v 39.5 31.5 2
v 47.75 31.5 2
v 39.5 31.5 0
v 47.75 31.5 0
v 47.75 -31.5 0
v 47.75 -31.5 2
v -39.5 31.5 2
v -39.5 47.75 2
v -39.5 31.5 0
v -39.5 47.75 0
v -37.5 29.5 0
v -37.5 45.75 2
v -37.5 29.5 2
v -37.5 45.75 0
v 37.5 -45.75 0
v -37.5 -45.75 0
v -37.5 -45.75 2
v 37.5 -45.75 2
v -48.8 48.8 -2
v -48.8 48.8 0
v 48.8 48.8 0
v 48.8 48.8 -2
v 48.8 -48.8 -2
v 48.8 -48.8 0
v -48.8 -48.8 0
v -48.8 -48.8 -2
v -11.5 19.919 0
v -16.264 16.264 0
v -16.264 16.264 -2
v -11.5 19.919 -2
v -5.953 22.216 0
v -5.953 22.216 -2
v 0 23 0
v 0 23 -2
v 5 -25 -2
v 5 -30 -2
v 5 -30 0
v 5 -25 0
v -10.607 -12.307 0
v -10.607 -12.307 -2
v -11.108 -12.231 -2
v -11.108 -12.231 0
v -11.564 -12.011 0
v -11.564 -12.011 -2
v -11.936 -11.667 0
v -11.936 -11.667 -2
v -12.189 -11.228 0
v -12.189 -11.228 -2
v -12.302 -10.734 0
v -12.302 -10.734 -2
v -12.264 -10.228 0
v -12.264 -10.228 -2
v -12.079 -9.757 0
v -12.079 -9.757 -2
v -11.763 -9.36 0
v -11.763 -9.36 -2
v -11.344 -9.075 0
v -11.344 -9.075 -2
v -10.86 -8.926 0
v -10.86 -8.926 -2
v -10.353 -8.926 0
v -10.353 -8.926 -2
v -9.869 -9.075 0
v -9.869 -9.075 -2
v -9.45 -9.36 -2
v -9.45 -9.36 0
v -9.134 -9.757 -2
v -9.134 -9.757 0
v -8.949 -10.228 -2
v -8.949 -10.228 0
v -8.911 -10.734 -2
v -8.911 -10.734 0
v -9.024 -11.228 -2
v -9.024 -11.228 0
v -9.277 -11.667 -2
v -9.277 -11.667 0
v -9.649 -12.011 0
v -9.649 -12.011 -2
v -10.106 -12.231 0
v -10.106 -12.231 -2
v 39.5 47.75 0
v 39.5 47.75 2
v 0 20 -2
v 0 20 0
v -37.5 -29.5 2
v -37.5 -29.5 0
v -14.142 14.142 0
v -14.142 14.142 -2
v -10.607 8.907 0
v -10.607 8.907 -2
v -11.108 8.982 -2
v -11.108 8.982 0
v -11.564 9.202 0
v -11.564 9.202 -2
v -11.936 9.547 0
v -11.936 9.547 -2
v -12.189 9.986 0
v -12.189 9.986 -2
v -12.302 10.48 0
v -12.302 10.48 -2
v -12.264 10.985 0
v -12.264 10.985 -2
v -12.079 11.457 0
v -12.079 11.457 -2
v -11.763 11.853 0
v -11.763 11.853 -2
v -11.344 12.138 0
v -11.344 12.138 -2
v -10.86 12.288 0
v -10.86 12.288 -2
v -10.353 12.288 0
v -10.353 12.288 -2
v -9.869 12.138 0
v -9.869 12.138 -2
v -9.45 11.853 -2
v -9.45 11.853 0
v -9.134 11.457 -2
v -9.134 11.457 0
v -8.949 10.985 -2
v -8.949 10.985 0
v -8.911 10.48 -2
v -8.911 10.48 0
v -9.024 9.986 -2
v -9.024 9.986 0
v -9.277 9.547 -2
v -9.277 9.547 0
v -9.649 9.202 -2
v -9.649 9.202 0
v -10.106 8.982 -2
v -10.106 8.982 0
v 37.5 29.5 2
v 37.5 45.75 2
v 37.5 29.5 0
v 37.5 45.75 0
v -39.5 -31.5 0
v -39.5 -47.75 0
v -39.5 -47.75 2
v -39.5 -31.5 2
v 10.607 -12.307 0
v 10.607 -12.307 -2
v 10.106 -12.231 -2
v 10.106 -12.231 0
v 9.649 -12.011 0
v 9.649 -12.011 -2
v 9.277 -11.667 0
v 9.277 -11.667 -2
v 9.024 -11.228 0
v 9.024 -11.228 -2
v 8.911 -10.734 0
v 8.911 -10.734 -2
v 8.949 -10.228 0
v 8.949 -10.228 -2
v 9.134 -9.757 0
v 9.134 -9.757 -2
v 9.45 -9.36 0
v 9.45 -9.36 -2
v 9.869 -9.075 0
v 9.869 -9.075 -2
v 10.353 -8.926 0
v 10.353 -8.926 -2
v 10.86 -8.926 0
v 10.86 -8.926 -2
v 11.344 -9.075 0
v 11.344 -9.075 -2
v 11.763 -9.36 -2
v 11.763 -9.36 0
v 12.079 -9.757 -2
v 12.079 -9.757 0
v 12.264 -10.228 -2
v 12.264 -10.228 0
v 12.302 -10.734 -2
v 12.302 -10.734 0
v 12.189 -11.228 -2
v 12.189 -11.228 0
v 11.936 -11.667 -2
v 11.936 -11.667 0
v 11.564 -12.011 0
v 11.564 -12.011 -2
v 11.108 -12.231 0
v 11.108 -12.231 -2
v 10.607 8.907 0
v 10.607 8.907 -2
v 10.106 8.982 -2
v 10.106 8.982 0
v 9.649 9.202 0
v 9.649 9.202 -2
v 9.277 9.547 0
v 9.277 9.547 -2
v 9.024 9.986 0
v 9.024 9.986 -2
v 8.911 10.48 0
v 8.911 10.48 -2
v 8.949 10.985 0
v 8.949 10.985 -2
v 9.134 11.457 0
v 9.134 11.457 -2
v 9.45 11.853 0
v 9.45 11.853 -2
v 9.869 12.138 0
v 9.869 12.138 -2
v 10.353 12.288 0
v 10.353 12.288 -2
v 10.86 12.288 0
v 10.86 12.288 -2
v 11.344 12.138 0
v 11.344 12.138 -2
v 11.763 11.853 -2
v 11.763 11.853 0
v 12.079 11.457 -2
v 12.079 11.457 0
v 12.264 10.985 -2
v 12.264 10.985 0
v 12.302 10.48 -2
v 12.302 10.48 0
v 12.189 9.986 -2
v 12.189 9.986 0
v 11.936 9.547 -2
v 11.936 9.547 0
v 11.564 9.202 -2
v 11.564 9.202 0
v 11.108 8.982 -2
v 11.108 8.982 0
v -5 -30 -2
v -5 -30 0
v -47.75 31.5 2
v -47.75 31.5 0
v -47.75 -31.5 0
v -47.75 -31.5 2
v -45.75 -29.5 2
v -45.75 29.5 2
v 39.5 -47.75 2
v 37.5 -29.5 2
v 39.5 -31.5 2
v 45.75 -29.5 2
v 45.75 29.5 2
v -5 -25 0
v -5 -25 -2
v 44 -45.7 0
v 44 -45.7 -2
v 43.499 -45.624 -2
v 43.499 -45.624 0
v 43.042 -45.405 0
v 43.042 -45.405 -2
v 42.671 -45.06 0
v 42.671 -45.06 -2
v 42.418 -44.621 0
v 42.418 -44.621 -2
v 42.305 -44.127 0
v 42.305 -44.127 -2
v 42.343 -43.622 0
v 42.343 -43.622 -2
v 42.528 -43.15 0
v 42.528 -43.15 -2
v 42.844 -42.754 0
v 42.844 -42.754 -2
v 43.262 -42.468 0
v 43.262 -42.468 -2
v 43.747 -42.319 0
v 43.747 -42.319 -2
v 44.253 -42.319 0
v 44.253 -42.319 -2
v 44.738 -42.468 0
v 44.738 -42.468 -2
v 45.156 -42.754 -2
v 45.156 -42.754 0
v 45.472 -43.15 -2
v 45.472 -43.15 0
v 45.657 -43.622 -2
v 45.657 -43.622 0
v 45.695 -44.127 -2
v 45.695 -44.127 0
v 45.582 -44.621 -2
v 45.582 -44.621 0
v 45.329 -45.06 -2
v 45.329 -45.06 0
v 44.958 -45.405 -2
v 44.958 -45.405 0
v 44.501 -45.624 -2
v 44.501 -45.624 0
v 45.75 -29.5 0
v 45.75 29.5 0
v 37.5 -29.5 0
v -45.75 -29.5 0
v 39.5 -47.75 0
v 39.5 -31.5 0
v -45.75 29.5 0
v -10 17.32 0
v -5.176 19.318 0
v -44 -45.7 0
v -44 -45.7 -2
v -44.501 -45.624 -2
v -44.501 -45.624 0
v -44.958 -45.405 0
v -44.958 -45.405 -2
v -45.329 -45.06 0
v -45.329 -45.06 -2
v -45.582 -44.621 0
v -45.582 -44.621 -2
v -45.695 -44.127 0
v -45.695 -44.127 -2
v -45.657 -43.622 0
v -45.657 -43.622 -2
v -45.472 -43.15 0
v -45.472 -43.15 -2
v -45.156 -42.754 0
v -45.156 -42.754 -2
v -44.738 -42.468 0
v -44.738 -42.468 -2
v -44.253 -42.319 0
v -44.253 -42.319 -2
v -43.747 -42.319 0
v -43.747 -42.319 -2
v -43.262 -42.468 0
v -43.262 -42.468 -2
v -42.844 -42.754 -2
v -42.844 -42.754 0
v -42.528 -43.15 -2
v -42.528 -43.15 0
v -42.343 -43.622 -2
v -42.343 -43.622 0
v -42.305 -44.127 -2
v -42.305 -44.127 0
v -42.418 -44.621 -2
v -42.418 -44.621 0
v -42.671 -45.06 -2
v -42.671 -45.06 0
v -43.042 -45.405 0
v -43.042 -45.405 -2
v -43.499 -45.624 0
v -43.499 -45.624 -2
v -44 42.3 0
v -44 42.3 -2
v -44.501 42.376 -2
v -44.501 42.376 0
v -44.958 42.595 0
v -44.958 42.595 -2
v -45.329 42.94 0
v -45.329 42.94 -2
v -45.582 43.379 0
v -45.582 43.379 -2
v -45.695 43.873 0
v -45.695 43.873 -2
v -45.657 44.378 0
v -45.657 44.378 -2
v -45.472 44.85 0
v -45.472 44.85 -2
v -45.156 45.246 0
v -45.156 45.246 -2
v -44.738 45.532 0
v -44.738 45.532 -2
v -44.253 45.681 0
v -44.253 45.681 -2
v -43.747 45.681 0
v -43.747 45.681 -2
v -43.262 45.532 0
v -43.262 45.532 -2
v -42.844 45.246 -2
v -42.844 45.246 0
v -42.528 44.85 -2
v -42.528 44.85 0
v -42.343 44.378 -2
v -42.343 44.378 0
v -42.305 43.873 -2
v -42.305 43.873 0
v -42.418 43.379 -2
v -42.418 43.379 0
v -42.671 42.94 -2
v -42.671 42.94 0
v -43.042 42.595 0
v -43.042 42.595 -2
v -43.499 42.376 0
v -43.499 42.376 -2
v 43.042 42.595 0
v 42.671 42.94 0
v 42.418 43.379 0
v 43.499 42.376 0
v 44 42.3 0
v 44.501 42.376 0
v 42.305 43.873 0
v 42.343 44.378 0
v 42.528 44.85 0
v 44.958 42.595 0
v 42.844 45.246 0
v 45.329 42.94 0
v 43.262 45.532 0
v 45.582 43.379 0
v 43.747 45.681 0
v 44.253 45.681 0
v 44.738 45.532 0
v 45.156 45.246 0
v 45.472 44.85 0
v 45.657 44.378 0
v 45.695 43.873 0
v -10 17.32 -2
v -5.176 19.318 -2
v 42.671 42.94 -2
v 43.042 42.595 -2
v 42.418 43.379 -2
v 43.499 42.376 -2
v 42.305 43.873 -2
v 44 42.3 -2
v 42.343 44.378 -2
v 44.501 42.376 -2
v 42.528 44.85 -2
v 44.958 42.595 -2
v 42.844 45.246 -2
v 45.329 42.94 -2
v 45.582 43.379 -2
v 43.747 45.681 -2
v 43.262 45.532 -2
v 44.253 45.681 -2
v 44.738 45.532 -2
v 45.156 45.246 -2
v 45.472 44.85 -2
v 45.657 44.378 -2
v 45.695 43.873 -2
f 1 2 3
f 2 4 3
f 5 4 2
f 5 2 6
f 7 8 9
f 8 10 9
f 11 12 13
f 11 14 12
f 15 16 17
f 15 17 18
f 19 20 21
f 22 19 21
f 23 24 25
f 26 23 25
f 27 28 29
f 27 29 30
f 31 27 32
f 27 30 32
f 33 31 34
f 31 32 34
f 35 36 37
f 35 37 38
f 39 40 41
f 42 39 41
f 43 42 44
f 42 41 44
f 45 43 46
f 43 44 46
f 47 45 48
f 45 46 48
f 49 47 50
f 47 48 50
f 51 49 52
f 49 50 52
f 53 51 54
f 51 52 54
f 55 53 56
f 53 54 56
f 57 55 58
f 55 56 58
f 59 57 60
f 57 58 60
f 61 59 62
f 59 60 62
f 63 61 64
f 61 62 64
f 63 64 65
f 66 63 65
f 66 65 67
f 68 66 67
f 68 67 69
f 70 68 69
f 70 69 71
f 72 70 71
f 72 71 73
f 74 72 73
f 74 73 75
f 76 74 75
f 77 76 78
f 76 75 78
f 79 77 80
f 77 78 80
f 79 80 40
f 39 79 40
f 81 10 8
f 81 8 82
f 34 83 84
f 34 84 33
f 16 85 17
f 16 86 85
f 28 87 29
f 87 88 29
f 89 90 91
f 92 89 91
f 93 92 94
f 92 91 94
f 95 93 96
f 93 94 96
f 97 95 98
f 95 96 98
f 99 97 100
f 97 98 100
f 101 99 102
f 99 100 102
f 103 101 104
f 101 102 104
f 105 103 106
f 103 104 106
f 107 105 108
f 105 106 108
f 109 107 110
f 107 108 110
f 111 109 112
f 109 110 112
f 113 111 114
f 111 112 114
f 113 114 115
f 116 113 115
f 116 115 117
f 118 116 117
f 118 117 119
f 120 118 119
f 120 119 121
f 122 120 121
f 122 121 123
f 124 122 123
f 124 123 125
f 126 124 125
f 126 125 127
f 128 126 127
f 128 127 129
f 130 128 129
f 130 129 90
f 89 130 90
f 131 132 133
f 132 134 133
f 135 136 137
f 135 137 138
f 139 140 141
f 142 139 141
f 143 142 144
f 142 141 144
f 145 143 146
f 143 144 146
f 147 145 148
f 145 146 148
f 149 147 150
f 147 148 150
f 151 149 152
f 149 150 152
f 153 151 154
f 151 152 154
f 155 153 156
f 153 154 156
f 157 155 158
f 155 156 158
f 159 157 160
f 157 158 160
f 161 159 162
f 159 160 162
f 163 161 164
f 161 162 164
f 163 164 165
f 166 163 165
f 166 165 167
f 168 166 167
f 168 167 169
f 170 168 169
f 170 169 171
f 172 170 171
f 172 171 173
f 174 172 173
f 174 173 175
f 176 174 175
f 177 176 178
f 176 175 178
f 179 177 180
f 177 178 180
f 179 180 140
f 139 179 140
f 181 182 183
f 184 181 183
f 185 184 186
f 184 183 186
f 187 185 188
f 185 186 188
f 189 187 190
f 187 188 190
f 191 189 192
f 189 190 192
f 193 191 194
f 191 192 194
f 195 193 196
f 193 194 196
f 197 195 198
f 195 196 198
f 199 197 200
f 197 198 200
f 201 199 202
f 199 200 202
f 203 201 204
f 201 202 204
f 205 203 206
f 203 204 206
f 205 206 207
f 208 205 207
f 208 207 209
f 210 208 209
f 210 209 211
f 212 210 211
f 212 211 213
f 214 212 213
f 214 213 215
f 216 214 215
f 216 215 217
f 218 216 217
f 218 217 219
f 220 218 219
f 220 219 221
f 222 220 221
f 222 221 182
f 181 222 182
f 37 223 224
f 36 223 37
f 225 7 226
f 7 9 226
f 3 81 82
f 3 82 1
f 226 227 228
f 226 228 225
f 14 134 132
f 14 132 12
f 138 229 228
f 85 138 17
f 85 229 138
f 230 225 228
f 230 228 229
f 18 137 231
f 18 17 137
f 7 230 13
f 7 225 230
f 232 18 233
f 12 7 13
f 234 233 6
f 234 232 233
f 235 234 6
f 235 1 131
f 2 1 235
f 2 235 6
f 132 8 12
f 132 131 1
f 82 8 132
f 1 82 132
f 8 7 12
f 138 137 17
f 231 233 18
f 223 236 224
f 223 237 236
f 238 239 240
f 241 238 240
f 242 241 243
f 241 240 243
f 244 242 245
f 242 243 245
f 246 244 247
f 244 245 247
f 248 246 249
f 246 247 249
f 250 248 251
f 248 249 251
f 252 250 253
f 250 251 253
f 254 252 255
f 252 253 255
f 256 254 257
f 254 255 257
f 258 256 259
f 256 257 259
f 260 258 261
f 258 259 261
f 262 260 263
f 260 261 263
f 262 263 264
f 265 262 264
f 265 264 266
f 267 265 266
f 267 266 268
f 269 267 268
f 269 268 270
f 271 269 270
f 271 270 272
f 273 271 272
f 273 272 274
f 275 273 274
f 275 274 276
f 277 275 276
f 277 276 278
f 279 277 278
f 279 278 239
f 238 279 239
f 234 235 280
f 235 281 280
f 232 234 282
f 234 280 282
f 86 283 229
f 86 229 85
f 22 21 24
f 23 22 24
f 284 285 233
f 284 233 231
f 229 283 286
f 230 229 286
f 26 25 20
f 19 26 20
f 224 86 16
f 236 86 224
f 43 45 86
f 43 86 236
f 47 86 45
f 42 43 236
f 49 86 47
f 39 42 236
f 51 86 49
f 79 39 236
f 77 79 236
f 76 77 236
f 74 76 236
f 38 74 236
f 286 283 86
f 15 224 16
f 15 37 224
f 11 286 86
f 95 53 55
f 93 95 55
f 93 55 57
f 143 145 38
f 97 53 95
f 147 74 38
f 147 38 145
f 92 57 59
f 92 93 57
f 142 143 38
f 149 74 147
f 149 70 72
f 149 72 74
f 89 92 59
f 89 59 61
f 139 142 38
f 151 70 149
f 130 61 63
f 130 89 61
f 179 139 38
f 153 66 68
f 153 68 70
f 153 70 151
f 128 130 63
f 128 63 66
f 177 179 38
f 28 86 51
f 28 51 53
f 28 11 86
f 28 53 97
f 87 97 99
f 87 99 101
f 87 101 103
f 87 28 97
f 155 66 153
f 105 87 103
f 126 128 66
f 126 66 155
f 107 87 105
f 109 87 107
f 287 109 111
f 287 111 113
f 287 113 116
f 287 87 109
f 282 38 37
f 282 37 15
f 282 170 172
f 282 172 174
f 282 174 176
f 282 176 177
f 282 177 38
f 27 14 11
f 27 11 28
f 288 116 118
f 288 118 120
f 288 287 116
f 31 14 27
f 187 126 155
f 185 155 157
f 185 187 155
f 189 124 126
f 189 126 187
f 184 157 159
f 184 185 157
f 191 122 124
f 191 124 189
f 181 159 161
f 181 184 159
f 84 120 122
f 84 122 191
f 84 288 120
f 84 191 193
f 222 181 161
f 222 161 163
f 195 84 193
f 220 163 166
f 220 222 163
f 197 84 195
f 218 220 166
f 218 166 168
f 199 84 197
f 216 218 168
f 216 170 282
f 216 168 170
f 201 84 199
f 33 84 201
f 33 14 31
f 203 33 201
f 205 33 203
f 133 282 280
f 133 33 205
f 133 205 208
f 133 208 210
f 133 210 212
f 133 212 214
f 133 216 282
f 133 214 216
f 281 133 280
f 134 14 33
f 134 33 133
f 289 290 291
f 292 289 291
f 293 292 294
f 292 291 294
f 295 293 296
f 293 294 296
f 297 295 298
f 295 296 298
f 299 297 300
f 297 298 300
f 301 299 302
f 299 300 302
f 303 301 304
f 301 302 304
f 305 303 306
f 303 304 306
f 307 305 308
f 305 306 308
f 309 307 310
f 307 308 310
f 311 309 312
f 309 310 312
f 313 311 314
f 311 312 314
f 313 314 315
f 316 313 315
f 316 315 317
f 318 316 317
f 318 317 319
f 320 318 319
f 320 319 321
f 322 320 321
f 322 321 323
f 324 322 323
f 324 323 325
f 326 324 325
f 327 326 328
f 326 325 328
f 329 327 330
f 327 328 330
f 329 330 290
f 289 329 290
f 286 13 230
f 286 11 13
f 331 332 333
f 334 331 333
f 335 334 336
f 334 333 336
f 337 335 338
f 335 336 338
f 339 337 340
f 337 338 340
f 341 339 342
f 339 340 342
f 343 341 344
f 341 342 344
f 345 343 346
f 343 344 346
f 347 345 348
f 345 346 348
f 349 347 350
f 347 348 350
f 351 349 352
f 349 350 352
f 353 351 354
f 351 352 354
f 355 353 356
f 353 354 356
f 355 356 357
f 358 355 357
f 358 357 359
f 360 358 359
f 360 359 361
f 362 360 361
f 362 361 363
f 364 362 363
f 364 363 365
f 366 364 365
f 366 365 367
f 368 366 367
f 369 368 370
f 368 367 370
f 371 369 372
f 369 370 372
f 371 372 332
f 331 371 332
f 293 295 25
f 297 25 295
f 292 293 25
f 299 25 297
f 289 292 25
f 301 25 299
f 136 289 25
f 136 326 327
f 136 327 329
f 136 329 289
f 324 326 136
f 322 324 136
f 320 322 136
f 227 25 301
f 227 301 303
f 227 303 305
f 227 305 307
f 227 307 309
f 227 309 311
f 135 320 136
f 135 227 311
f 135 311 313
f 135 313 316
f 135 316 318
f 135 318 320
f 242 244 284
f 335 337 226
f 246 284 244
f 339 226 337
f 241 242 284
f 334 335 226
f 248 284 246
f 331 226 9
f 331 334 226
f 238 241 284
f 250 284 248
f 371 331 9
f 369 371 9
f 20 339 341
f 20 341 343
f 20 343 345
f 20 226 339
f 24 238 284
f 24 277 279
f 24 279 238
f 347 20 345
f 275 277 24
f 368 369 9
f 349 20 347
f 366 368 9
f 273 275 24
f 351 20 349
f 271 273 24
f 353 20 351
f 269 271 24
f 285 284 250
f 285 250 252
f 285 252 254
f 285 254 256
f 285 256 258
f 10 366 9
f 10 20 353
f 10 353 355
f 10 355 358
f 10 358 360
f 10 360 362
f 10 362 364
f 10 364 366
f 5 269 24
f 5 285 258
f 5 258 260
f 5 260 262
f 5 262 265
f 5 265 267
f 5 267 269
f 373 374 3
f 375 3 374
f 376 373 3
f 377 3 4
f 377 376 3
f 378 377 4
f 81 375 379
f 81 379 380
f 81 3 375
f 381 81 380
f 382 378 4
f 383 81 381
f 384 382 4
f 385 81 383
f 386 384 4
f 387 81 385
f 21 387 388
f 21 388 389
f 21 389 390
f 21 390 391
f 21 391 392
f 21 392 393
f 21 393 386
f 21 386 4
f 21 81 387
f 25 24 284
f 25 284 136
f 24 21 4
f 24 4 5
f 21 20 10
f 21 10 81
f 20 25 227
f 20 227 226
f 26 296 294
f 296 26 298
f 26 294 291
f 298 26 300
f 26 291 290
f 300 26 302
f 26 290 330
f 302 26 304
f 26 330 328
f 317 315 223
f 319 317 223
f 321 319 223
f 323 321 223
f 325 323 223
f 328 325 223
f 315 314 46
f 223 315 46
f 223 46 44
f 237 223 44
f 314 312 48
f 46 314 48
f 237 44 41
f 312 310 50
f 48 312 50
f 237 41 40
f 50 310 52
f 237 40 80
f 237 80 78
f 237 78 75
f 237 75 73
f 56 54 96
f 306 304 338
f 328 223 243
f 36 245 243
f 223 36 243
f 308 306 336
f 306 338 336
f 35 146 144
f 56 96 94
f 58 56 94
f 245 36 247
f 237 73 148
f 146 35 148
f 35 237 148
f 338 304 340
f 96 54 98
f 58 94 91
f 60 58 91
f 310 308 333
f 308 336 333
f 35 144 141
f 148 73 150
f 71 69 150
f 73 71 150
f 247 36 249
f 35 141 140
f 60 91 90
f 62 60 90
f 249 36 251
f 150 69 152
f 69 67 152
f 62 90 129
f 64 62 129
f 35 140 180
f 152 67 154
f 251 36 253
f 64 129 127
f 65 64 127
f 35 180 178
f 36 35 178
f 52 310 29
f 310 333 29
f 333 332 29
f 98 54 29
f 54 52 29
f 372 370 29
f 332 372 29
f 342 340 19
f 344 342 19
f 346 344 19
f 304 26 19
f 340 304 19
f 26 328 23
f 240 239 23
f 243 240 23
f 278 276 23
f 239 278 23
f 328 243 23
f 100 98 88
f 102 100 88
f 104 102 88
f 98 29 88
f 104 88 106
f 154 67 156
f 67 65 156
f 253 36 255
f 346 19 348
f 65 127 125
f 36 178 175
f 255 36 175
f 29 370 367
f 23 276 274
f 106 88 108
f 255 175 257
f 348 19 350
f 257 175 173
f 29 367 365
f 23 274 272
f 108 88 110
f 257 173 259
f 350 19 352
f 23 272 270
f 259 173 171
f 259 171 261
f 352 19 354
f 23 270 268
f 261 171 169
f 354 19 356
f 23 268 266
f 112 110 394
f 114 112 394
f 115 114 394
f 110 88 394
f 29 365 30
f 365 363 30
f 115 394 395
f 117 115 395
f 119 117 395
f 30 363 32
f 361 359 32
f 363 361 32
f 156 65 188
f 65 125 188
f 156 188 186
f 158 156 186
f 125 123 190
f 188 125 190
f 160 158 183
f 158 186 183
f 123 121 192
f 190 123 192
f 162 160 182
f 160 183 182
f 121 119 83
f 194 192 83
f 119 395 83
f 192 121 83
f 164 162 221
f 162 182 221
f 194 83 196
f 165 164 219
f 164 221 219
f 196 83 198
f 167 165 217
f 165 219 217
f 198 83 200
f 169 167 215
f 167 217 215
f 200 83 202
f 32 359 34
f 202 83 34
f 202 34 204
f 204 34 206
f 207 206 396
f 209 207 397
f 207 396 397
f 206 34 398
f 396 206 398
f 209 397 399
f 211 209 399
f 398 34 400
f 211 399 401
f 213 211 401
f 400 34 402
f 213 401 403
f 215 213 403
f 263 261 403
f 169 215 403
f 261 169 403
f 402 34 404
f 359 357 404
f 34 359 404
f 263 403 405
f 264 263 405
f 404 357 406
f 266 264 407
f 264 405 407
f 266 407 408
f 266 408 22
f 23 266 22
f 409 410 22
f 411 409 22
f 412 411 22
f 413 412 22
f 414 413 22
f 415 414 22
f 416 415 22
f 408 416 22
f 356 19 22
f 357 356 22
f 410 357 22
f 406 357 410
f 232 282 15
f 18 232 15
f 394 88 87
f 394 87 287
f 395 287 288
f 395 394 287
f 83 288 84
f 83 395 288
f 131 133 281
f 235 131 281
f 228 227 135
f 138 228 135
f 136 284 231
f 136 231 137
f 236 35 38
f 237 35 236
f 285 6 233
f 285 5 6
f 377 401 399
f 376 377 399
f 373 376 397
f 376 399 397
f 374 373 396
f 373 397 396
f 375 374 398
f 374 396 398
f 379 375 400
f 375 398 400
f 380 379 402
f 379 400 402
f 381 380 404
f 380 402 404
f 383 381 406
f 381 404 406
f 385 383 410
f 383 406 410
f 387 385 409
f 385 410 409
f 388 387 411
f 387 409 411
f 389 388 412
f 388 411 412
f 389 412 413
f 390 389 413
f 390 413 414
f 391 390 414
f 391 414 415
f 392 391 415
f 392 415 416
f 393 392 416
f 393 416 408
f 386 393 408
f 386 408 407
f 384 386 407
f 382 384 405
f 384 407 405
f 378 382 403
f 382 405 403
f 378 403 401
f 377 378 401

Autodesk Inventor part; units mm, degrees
ref_plane "YZ Plane" through (0, 0, 0) normal (1, 0, 0) x (0, 1, 0)
ref_plane "XZ Plane" through (0, 0, 0) normal (0, 1, 0) x (-1, 0, 0)
ref_plane "XY Plane" through (0, 0, 0) normal (0, 0, 1) x (1, 0, 0)
sketch "Skizze1" plane through (0, 0, 0) normal (0, 0, 1) x (1, 0, 0)
  line L0 (48.8, -48.8) -> (-48.8, -48.8)
  line L1 (-48.8, -48.8) -> (-48.8, 48.8)
  line L2 (-48.8, 48.8) -> (48.8, 48.8)
  line L3 (48.8, 48.8) -> (48.8, -48.8)
  line L4 (48.8, -48.8) -> (-48.8, 48.8) construction
  line L5 (-48.8, -48.8) -> (48.8, 48.8) construction
  line L6 (-50, 50) -> (50, 50) construction
  line L7 (50, 50) -> (50, -50) construction
  line L8 (50, -50) -> (-50, -50) construction
  line L9 (-50, -50) -> (-50, 50) construction
  line L10 (-50, 50) -> (50, -50) construction
  line L11 (50, 50) -> (-50, -50) construction
  line L12 (47.75, -47.75) -> (-47.75, -47.75)
  line L13 (-47.75, -47.75) -> (-47.75, 47.75)
  line L14 (-47.75, 47.75) -> (47.75, 47.75)
  line L15 (47.75, 47.75) -> (47.75, -47.75)
  line L16 (47.75, -47.75) -> (-47.75, 47.75) construction
  line L17 (-47.75, -47.75) -> (47.75, 47.75) construction
  circle A0 centre (0, 0) radius 15 construction
  line L18 (-50, 50) -> (-39.5, 50) construction
  line L19 (-39.5, 50) -> (-39.5, 31.5) construction
  line L20 (-39.5, 31.5) -> (-50, 31.5) construction
  line L21 (-50, 31.5) -> (-50, 50) construction
  line L22 (50, 50) -> (39.5, 50) construction
  line L23 (39.5, 50) -> (39.5, 31.5) construction
  line L24 (39.5, 31.5) -> (50, 31.5) construction
  line L25 (50, 31.5) -> (50, 50) construction
  line L26 (-50, -50) -> (-39.5, -50) construction
  line L27 (-39.5, -50) -> (-39.5, -31.5) construction
  line L28 (-39.5, -31.5) -> (-50, -31.5) construction
  line L29 (-50, -31.5) -> (-50, -50) construction
  line L30 (50, -50) -> (39.5, -50) construction
  line L31 (39.5, -50) -> (39.5, -31.5) construction
  line L32 (39.5, -31.5) -> (50, -31.5) construction
  line L33 (50, -31.5) -> (50, -50) construction
  line L34 (-39.5, 47.75) -> (39.5, 47.75)
  line L35 (39.5, 47.75) -> (39.5, 45.75)
  line L36 (39.5, 45.75) -> (-39.5, 45.75)
  line L37 (-39.5, 45.75) -> (-39.5, 47.75)
  line L38 (47.75, 31.5) -> (45.75, 31.5)
  line L39 (45.75, 31.5) -> (45.75, -31.5)
  line L40 (45.75, -31.5) -> (47.75, -31.5)
  line L41 (47.75, -31.5) -> (47.75, 31.5)
  line L42 (39.5, -47.75) -> (-39.5, -47.75)
  line L43 (-39.5, -47.75) -> (-39.5, -45.75)
  line L44 (-39.5, -45.75) -> (39.5, -45.75)
  line L45 (39.5, -45.75) -> (39.5, -47.75)
  line L46 (-47.75, -31.5) -> (-45.75, -31.5)
  line L47 (-45.75, -31.5) -> (-45.75, 31.5)
  line L48 (-45.75, 31.5) -> (-47.75, 31.5)
  line L49 (-47.75, 31.5) -> (-47.75, -31.5)
  line L50 (-39.5, 45.75) -> (-39.5, 31.5)
  line L51 (-45.75, 31.5) -> (-39.5, 31.5)
  line L52 (39.5, 45.75) -> (39.5, 31.5)
  line L53 (39.5, 31.5) -> (45.75, 31.5)
  line L54 (45.75, -31.5) -> (39.5, -31.5)
  line L55 (39.5, -31.5) -> (39.5, -45.75)
  line L56 (-39.5, -45.75) -> (-39.5, -31.5)
  line L57 (-45.75, -31.5) -> (-39.5, -31.5)
  line L58 (-45.75, -29.5) -> (-37.5, -29.5)
  line L59 (-37.5, -29.5) -> (-37.5, -45.75)
  line L60 (45.75, -29.5) -> (37.5, -29.5)
  line L61 (37.5, -29.5) -> (37.5, -45.75)
  line L62 (37.5, 45.75) -> (37.5, 29.5)
  line L63 (37.5, 29.5) -> (45.75, 29.5)
  line L64 (-37.5, 45.75) -> (-37.5, 29.5)
  line L65 (-37.5, 29.5) -> (-45.75, 29.5)
  line L66 (-39.5, 45.75) -> (-37.5, 45.75)
  line L67 (-45.75, 29.5) -> (-45.75, 31.5)
  line L68 (37.5, 45.75) -> (39.5, 45.75)
  line L69 (45.75, 29.5) -> (45.75, 31.5)
  line L70 (45.75, -29.5) -> (45.75, -31.5)
  line L71 (37.5, -45.75) -> (39.5, -45.75)
  line L72 (-39.5, -45.75) -> (-37.5, -45.75)
  line L73 (-45.75, -31.5) -> (-45.75, -29.5)
  point P0 (0, 0)
  point P1 (0, 0)
  point P2 (-10.6066, 10.6066)
  point P3 (10.6066, 10.6066)
  point P4 (10.6066, -10.6066)
  point P5 (-10.6066, -10.6066)
  point P6 (-44, 44)
  point P7 (44, 44)
  point P8 (44, -44)
  point P9 (-44, -44)
  dimension "d0" = 97.6
  dimension "d55" = 30
  dimension "d61" = 100
  dimension "d62" = 95.5
  dimension "d63" = 18.5
  dimension "d64" = 10.5
  dimension "d65" = 2
  dimension "d67" = 6
extrude "Extrusion1" add sketch "Skizze1" against normal blind 2 contours L0 L1 L2 L3 | L12 L45 L55 L54 L40 L15 | L12 L43 L44 L45 | L40 L39 L38 L15 | L12 L13 L46 L57 L56 L43 | L44 L61 L60 L39 L54 L55 | L38 L53 L52 L35 L14 L15 | L56 L57 L47 L58 L59 L44 | L44 L59 L58 L47 L65 L64 L36 L62 L63 L39 L60 L61 | L39 L63 L62 L36 L52 L53 | L13 L48 L47 L46 | L35 L36 L37 L14 | L13 L14 L37 L50 L51 L48 | L51 L50 L36 L64 L65 L47
hole "Bohrung1" at (-10.6066, 10.6066, 0) at (10.6066, 10.6066, 0) at (-10.6066, -10.6066, 0) at (10.6066, -10.6066, 0) at (-44, 44, 0) at (44, 44, 0) at (44, -44, 0) at (-44, -44, 0) direction (0, 0, -1) diameter 3.4 end through all
extrude "Extrusion4" add sketch "Skizze1" along normal blind 2 contours L12 L43 L44 L45 | L40 L39 L38 L15 | L44 L61 L60 L39 L54 L55 | L56 L57 L47 L58 L59 L44 | L39 L63 L62 L36 L52 L53 | L13 L48 L47 L46 | L35 L36 L37 L14 | L51 L50 L36 L64 L65 L47
sketch "Skizze2" plane through (0, 0, -2) normal (0, 0, -1) x (-1, 0, 0)
  line L0 (-50, -50) -> (50, -50) construction
  line L1 (50, -50) -> (50, 50) construction
  line L2 (50, 50) -> (-50, 50) construction
  line L3 (-50, 50) -> (-50, -50) construction
  line L4 (-50, -50) -> (50, 50) construction
  line L5 (50, -50) -> (-50, 50) construction
  circle A0 centre (0, 0) radius 20 construction
  line L6 (0, 20) -> (0, 23)
  arc A1 (14.1421, 14.1421) -> (0, 20) centre (0, 0) ccw
  arc A2 (16.2635, 16.2635) -> (0, 23) centre (0, 0) ccw
  line L7 (14.1421, 14.1421) -> (16.2635, 16.2635)
  line L8 (-5, -25) -> (5, -25)
  line L9 (5, -25) -> (5, -30)
  line L10 (5, -30) -> (-5, -30)
  line L11 (-5, -30) -> (-5, -25)
  line L12 (-5, -25) -> (5, -30) construction
  line L13 (5, -25) -> (-5, -30) construction
  point P0 (0, 0)
  point P1 (0, 0)
  point P2 (0, -27.5)
  point P3 (0, -27.5)
  dimension "d45" = 100
  dimension "d46" = 100
  dimension "d47" = 40
  dimension "d53" = 3
  dimension "d54" = 45
  dimension "d57" = 10
  dimension "d58" = 5
  dimension "d59" = 25
extrude "Extrusion5" cut sketch "Skizze2" against normal through all
properties part number "DayLightGlow_BaseCover"
